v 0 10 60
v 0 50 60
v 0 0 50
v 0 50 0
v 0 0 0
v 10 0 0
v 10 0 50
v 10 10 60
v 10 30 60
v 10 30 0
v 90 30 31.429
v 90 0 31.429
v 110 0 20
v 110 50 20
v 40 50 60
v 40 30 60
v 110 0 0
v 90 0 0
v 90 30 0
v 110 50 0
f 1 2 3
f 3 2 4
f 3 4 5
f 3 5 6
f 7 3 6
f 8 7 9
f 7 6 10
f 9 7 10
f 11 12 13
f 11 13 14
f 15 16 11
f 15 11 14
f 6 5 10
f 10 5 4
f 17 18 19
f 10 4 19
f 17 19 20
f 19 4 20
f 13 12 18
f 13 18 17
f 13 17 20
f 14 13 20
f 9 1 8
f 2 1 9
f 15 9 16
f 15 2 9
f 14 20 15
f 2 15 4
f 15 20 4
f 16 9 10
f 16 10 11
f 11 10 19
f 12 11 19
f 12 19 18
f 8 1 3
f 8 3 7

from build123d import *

# Parameters (mm, degrees)
F1_DEPTH = 60
F2_SIZE  = 10
F3_SIZE2 = 70
F3_SIZE  = 40


with BuildPart() as f1:
    # F0 (on Top) → F1 (new body)
    with BuildSketch(Plane.XY):
        Polygon((0, 50), (0, 0), (10, 0), (10, 30), (90, 30), (90, 0), (110, 0), (110, 50), align=None)
    extrude(amount=F1_DEPTH)

    # F2
    f2_edges = [f1.edges().sort_by_distance(p)[0] for p in [
        (5, 0, 60),
    ]]
    chamfer(f2_edges, length=F2_SIZE)

    # F3
    f3_edges = [f1.edges().sort_by_distance(p)[0] for p in [
        (110, 25, 60),
    ]]
    f3_side = f1.faces().sort_by_distance((110, 25, 30))[0]
    chamfer(f3_edges, length=F3_SIZE, length2=F3_SIZE2, reference=f3_side)


solid = f1.part
